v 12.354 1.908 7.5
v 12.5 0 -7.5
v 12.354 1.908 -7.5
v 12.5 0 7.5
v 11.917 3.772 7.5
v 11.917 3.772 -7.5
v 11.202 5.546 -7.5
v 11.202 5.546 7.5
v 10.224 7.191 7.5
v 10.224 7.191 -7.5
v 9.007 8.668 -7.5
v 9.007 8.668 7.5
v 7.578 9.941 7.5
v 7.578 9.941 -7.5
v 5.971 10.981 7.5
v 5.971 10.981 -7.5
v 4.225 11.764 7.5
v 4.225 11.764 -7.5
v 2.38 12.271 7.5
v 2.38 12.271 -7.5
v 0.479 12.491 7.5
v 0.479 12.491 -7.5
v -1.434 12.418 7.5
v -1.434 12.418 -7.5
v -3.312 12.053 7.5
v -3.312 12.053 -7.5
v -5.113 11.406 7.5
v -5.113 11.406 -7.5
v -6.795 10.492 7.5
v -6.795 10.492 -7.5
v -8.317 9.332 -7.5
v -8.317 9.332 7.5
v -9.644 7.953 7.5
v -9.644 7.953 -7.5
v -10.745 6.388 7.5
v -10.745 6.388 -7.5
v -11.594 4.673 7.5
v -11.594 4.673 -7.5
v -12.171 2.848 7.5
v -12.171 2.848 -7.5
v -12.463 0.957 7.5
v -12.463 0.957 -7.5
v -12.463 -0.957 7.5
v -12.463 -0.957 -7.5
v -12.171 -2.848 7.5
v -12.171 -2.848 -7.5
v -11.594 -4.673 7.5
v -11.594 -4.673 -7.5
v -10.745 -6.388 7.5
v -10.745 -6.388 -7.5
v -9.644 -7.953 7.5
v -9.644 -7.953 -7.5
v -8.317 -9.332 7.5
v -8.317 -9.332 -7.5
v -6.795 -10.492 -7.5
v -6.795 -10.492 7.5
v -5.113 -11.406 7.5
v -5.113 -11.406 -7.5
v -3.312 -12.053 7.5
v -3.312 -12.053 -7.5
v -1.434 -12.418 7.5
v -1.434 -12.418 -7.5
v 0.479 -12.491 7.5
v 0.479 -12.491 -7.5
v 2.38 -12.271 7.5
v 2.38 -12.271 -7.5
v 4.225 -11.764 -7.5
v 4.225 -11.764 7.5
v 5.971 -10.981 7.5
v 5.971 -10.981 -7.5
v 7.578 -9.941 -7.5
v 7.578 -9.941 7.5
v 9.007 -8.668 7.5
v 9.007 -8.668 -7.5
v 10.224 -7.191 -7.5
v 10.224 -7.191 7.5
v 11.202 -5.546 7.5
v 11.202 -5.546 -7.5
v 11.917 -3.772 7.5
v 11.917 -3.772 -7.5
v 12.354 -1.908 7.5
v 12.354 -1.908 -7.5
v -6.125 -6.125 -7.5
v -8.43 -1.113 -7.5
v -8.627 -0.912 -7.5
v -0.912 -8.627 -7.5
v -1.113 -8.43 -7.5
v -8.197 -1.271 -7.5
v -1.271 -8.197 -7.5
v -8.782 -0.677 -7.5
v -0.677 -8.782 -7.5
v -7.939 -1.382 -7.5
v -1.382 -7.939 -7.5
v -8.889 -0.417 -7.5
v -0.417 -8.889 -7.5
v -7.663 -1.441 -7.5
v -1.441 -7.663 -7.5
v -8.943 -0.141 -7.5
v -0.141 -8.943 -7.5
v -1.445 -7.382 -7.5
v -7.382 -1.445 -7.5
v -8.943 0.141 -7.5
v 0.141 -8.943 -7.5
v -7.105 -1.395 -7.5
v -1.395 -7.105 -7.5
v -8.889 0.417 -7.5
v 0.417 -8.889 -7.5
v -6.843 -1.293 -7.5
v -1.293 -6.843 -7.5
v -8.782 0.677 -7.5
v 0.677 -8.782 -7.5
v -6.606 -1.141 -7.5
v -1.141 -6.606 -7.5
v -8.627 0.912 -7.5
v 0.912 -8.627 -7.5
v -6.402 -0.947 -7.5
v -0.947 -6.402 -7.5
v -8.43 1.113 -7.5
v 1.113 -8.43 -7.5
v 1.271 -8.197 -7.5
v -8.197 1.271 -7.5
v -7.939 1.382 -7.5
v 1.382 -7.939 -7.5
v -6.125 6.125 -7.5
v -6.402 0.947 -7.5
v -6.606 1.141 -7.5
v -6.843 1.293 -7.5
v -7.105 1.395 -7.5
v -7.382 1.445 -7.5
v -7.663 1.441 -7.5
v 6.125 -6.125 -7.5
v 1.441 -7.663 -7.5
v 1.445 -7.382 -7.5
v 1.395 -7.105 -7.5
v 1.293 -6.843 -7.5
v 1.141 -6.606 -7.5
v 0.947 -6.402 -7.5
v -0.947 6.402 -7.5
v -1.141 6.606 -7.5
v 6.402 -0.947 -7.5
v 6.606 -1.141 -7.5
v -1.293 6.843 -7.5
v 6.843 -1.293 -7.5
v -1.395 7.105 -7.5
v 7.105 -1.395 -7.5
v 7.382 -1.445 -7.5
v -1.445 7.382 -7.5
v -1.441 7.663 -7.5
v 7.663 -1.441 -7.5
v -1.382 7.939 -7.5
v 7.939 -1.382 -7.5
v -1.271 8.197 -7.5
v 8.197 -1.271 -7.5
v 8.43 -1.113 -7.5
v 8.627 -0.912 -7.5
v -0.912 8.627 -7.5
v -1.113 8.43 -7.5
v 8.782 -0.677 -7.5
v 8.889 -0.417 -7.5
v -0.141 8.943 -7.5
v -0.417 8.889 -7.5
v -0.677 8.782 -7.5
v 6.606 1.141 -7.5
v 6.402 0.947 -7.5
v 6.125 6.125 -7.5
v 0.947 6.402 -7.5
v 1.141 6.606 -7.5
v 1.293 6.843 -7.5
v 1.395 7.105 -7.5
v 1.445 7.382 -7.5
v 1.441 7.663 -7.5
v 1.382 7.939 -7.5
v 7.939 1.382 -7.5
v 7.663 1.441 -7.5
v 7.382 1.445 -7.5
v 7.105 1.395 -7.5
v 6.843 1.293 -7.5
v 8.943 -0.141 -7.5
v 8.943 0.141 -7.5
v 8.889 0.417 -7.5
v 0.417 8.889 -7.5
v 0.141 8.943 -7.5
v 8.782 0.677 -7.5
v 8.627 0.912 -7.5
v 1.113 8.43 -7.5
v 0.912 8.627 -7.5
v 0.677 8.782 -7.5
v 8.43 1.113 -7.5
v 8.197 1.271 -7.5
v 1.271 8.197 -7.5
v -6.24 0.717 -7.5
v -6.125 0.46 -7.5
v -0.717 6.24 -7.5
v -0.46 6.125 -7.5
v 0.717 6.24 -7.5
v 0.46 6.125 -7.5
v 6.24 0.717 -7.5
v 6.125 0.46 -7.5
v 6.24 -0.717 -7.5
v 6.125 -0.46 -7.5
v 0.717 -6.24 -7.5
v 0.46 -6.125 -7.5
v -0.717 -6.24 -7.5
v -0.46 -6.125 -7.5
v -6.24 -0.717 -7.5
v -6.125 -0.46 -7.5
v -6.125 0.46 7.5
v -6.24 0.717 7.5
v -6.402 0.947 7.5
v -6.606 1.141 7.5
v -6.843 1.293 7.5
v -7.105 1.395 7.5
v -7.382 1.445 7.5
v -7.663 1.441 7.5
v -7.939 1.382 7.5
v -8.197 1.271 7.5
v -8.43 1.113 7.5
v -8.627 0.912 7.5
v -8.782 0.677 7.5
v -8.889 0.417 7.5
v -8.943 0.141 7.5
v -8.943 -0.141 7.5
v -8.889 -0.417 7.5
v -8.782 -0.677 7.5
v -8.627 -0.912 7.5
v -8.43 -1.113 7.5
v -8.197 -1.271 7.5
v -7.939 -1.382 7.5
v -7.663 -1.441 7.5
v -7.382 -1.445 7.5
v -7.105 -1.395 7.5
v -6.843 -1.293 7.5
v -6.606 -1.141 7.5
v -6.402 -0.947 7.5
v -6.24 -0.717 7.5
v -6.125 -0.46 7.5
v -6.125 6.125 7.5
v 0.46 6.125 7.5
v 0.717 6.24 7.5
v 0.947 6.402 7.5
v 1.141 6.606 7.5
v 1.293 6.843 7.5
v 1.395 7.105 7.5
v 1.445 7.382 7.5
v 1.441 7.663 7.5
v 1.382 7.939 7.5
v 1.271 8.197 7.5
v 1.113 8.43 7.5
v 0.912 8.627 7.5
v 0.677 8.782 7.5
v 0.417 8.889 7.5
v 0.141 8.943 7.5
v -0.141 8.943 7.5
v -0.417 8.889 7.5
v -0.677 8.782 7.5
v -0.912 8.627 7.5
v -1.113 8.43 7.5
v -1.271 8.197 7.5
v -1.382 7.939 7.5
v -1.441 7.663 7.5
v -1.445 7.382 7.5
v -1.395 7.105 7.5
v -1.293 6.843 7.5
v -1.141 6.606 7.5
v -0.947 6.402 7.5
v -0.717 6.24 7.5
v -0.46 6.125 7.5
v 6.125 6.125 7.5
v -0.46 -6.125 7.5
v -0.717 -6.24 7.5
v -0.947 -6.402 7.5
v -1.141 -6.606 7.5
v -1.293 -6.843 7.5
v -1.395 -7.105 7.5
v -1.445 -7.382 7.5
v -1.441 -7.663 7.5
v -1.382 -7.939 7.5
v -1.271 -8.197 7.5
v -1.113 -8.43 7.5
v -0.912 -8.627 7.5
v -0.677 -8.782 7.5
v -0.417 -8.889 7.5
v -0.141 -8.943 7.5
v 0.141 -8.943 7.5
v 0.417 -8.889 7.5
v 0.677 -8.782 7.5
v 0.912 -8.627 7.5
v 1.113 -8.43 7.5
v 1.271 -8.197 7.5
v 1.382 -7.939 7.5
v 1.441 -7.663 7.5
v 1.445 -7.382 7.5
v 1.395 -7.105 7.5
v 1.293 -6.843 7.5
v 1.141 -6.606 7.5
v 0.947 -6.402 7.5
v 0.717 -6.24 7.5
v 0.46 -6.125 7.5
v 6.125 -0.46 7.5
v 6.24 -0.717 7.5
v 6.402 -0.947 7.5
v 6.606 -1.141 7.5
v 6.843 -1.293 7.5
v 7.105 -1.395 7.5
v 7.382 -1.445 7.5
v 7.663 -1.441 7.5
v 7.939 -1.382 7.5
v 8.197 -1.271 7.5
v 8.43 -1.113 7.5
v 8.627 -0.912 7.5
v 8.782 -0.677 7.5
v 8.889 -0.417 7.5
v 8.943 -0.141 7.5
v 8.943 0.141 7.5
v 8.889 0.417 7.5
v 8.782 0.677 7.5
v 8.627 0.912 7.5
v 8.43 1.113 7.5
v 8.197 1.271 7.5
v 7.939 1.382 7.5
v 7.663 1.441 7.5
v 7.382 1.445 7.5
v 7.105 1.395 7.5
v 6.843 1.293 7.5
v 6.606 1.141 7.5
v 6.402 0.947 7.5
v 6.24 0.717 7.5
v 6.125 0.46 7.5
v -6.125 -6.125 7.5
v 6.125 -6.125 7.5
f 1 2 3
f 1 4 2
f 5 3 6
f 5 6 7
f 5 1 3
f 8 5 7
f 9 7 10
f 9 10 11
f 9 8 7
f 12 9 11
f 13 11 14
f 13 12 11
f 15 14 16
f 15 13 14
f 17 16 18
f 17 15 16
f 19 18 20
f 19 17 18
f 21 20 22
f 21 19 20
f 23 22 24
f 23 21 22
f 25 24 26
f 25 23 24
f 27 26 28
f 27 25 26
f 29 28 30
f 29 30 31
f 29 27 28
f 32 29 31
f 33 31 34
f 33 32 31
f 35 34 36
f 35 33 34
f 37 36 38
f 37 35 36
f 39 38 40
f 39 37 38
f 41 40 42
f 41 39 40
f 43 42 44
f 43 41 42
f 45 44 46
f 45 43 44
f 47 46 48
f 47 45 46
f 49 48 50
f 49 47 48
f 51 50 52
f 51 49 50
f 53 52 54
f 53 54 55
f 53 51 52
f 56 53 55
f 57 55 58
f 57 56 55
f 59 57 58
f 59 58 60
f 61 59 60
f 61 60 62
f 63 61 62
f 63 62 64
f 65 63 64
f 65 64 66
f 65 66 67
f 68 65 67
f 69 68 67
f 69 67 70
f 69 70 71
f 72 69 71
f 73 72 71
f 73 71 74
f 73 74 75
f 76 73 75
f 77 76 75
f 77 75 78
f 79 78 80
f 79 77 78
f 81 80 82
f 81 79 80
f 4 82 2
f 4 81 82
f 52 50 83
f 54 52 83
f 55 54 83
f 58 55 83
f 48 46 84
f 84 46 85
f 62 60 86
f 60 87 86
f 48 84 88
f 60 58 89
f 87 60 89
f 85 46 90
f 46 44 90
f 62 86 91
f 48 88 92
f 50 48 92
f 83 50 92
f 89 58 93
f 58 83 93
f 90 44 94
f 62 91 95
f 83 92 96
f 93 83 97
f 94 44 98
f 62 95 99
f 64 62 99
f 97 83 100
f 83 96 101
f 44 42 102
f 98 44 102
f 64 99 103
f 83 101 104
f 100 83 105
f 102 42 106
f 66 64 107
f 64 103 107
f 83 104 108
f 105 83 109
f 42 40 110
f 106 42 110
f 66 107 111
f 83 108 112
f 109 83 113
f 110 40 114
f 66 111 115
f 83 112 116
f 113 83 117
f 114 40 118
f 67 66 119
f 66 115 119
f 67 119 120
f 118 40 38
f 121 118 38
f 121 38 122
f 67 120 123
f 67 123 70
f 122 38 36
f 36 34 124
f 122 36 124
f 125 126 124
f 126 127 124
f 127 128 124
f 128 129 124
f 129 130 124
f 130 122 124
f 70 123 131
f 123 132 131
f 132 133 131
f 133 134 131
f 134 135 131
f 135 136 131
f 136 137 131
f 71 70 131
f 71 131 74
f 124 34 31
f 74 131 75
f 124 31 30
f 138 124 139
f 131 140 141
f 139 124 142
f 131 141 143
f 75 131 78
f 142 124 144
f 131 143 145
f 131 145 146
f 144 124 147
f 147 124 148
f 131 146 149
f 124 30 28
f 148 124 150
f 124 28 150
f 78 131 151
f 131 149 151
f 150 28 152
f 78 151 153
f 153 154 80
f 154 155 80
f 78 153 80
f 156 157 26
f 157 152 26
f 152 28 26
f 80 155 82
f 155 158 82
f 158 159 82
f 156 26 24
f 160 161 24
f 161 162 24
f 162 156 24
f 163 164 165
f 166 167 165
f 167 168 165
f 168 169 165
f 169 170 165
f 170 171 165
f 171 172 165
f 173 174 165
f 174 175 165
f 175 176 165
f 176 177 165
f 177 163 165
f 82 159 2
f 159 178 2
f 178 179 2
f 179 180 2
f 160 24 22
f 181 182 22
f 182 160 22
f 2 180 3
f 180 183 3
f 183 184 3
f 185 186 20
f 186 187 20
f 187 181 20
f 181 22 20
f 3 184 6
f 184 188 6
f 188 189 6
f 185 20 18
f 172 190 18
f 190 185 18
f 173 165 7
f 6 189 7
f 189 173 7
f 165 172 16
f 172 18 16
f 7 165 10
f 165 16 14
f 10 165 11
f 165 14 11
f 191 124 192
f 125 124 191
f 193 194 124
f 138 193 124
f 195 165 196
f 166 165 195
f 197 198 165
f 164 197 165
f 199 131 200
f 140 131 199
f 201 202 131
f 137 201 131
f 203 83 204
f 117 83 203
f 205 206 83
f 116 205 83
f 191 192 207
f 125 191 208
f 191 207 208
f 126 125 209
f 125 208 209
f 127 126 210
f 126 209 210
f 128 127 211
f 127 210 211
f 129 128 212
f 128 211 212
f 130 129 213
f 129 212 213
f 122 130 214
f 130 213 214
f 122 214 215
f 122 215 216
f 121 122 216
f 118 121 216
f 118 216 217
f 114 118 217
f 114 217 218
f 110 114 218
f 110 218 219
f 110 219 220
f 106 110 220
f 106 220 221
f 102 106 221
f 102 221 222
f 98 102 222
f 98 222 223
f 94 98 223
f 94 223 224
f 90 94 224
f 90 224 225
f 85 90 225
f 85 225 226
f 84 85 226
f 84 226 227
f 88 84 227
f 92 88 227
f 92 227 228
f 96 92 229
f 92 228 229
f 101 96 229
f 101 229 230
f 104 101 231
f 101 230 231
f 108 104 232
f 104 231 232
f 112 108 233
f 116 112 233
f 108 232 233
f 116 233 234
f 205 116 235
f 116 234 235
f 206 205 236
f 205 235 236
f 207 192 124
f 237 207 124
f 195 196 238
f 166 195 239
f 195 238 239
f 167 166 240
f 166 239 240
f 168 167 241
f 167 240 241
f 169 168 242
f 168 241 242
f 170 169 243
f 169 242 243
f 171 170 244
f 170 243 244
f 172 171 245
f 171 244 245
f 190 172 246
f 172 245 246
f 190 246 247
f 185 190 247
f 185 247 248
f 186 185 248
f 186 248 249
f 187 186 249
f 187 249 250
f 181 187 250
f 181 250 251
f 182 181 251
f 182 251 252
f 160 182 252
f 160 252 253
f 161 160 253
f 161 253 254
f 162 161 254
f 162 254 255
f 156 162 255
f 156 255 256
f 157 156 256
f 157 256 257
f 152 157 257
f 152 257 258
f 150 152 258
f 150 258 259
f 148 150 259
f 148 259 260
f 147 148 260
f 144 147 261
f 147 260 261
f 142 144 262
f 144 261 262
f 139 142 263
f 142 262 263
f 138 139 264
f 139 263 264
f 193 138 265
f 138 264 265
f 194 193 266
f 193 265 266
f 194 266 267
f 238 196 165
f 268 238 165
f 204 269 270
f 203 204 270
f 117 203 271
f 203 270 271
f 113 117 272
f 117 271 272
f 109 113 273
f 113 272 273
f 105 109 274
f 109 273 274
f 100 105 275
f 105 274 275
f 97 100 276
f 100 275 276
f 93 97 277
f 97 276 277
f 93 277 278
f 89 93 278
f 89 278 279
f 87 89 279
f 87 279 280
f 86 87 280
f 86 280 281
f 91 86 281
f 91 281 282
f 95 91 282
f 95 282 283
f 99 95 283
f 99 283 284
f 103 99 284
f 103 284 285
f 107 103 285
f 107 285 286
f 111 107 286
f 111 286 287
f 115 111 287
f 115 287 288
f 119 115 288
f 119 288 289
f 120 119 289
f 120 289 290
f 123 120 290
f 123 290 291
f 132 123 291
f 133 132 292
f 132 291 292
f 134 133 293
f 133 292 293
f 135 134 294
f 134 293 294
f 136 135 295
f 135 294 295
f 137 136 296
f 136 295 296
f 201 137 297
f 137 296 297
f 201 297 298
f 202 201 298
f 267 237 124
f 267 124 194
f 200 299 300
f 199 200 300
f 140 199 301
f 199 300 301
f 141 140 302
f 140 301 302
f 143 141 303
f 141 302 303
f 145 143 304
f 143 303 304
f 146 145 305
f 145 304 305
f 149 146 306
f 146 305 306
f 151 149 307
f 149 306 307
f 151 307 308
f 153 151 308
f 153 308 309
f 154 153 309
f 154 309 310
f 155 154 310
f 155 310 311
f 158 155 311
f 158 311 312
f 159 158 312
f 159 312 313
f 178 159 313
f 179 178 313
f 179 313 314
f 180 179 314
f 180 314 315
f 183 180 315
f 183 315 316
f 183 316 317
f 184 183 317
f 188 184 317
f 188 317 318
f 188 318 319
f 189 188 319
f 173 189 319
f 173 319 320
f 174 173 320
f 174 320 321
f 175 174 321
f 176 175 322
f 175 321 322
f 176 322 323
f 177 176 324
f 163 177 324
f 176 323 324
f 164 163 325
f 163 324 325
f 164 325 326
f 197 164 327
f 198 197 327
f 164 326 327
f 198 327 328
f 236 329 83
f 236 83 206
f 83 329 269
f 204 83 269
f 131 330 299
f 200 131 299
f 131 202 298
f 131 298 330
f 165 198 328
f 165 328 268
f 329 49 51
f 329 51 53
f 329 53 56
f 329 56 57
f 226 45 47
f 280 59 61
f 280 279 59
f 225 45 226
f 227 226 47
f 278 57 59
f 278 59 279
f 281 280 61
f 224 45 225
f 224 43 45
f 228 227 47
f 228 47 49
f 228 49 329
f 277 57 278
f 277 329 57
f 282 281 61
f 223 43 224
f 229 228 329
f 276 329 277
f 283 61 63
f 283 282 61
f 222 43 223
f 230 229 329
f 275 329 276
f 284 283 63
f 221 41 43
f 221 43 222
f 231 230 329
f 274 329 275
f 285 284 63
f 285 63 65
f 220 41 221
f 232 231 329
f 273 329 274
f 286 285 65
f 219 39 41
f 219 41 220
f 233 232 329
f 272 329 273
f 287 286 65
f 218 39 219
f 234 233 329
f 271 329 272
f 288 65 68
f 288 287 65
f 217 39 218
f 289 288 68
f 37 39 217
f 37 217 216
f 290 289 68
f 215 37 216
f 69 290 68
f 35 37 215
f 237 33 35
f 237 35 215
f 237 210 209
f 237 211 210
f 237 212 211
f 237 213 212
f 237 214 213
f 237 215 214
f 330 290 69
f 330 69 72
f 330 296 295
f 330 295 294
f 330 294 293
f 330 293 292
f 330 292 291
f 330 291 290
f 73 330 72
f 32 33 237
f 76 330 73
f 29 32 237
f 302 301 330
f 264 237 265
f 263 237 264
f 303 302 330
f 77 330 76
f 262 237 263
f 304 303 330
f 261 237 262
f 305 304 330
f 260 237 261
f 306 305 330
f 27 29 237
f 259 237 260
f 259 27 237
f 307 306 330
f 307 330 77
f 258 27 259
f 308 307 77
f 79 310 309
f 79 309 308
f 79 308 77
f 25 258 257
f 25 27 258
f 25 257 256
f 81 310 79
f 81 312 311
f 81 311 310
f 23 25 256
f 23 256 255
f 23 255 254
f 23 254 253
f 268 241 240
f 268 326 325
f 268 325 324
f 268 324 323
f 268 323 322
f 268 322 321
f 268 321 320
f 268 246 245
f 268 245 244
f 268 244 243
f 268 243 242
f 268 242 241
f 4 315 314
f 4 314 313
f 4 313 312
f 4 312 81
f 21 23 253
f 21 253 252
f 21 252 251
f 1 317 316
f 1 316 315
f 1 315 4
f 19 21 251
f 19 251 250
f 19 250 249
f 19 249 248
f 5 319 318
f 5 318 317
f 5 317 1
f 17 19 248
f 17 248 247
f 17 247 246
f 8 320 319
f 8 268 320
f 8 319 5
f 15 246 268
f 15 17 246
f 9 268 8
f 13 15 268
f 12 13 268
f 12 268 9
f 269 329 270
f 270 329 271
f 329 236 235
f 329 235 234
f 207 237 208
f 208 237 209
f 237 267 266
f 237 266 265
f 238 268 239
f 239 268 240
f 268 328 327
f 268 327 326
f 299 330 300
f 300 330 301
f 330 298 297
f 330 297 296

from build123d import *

# Parameters (mm, degrees)
SKETCH1_R           = 12.5
BOSS_EXTRUDE1_DEPTH = 7.5
CUT_EXTRUDE1_REACH  = 25.184
SKETCH8_W           = 12.25
SKETCH8_H           = 12.25
CUT_EXTRUDE4_REACH  = 25.184
SKETCH11_R          = 1.45


with BuildPart() as part:
    # Sketch1 → Boss-Extrude1 (new, symmetric)
    with BuildSketch(Plane.XY):
        Circle(SKETCH1_R)
    extrude(amount=BOSS_EXTRUDE1_DEPTH, both=True)

    # Sketch8 → Cut-Extrude1 (cut, up to next)
    with BuildSketch(Plane.XY.offset(7.5), mode=Mode.PRIVATE) as cut_extrude1_sk1:
        Rectangle(SKETCH8_W, SKETCH8_H)
    cut_extrude1_tool1 = extrude(cut_extrude1_sk1.sketch, amount=-CUT_EXTRUDE1_REACH, mode=Mode.PRIVATE) & part.part
    add(cut_extrude1_tool1.solids().sort_by_distance((0, 0, 7.5))[0], mode=Mode.SUBTRACT)

    # Sketch11 → Cut-Extrude4 (cut, up to next)
    with BuildSketch(Plane.XY.offset(7.5), mode=Mode.PRIVATE) as cut_extrude4_sk1:
        with Locations((7.5, 0)):
            Circle(SKETCH11_R)
    cut_extrude4_tool1 = extrude(cut_extrude4_sk1.sketch, amount=-CUT_EXTRUDE4_REACH, mode=Mode.PRIVATE) & part.part
    # Sketch11 → Cut-Extrude4 (cut, up to next)
    with BuildSketch(Plane.XY.offset(7.5), mode=Mode.PRIVATE) as cut_extrude4_sk2:
        with Locations((0, -7.5)):
            Circle(SKETCH11_R)
    cut_extrude4_tool2 = extrude(cut_extrude4_sk2.sketch, amount=-CUT_EXTRUDE4_REACH, mode=Mode.PRIVATE) & part.part
    # Sketch11 → Cut-Extrude4 (cut, up to next)
    with BuildSketch(Plane.XY.offset(7.5), mode=Mode.PRIVATE) as cut_extrude4_sk3:
        with Locations((-7.5, 0)):
            Circle(SKETCH11_R)
    cut_extrude4_tool3 = extrude(cut_extrude4_sk3.sketch, amount=-CUT_EXTRUDE4_REACH, mode=Mode.PRIVATE) & part.part
    # Sketch11 → Cut-Extrude4 (cut, up to next)
    with BuildSketch(Plane.XY.offset(7.5), mode=Mode.PRIVATE) as cut_extrude4_sk4:
        with Locations((0, 7.5)):
            Circle(SKETCH11_R)
    cut_extrude4_tool4 = extrude(cut_extrude4_sk4.sketch, amount=-CUT_EXTRUDE4_REACH, mode=Mode.PRIVATE) & part.part
    add(cut_extrude4_tool1.solids().sort_by_distance((7.5, 0, 7.5))[0], mode=Mode.SUBTRACT)
    add(cut_extrude4_tool2.solids().sort_by_distance((0, -7.5, 7.5))[0], mode=Mode.SUBTRACT)
    add(cut_extrude4_tool3.solids().sort_by_distance((-7.5, 0, 7.5))[0], mode=Mode.SUBTRACT)
    add(cut_extrude4_tool4.solids().sort_by_distance((0, 7.5, 7.5))[0], mode=Mode.SUBTRACT)


solid = part.part
